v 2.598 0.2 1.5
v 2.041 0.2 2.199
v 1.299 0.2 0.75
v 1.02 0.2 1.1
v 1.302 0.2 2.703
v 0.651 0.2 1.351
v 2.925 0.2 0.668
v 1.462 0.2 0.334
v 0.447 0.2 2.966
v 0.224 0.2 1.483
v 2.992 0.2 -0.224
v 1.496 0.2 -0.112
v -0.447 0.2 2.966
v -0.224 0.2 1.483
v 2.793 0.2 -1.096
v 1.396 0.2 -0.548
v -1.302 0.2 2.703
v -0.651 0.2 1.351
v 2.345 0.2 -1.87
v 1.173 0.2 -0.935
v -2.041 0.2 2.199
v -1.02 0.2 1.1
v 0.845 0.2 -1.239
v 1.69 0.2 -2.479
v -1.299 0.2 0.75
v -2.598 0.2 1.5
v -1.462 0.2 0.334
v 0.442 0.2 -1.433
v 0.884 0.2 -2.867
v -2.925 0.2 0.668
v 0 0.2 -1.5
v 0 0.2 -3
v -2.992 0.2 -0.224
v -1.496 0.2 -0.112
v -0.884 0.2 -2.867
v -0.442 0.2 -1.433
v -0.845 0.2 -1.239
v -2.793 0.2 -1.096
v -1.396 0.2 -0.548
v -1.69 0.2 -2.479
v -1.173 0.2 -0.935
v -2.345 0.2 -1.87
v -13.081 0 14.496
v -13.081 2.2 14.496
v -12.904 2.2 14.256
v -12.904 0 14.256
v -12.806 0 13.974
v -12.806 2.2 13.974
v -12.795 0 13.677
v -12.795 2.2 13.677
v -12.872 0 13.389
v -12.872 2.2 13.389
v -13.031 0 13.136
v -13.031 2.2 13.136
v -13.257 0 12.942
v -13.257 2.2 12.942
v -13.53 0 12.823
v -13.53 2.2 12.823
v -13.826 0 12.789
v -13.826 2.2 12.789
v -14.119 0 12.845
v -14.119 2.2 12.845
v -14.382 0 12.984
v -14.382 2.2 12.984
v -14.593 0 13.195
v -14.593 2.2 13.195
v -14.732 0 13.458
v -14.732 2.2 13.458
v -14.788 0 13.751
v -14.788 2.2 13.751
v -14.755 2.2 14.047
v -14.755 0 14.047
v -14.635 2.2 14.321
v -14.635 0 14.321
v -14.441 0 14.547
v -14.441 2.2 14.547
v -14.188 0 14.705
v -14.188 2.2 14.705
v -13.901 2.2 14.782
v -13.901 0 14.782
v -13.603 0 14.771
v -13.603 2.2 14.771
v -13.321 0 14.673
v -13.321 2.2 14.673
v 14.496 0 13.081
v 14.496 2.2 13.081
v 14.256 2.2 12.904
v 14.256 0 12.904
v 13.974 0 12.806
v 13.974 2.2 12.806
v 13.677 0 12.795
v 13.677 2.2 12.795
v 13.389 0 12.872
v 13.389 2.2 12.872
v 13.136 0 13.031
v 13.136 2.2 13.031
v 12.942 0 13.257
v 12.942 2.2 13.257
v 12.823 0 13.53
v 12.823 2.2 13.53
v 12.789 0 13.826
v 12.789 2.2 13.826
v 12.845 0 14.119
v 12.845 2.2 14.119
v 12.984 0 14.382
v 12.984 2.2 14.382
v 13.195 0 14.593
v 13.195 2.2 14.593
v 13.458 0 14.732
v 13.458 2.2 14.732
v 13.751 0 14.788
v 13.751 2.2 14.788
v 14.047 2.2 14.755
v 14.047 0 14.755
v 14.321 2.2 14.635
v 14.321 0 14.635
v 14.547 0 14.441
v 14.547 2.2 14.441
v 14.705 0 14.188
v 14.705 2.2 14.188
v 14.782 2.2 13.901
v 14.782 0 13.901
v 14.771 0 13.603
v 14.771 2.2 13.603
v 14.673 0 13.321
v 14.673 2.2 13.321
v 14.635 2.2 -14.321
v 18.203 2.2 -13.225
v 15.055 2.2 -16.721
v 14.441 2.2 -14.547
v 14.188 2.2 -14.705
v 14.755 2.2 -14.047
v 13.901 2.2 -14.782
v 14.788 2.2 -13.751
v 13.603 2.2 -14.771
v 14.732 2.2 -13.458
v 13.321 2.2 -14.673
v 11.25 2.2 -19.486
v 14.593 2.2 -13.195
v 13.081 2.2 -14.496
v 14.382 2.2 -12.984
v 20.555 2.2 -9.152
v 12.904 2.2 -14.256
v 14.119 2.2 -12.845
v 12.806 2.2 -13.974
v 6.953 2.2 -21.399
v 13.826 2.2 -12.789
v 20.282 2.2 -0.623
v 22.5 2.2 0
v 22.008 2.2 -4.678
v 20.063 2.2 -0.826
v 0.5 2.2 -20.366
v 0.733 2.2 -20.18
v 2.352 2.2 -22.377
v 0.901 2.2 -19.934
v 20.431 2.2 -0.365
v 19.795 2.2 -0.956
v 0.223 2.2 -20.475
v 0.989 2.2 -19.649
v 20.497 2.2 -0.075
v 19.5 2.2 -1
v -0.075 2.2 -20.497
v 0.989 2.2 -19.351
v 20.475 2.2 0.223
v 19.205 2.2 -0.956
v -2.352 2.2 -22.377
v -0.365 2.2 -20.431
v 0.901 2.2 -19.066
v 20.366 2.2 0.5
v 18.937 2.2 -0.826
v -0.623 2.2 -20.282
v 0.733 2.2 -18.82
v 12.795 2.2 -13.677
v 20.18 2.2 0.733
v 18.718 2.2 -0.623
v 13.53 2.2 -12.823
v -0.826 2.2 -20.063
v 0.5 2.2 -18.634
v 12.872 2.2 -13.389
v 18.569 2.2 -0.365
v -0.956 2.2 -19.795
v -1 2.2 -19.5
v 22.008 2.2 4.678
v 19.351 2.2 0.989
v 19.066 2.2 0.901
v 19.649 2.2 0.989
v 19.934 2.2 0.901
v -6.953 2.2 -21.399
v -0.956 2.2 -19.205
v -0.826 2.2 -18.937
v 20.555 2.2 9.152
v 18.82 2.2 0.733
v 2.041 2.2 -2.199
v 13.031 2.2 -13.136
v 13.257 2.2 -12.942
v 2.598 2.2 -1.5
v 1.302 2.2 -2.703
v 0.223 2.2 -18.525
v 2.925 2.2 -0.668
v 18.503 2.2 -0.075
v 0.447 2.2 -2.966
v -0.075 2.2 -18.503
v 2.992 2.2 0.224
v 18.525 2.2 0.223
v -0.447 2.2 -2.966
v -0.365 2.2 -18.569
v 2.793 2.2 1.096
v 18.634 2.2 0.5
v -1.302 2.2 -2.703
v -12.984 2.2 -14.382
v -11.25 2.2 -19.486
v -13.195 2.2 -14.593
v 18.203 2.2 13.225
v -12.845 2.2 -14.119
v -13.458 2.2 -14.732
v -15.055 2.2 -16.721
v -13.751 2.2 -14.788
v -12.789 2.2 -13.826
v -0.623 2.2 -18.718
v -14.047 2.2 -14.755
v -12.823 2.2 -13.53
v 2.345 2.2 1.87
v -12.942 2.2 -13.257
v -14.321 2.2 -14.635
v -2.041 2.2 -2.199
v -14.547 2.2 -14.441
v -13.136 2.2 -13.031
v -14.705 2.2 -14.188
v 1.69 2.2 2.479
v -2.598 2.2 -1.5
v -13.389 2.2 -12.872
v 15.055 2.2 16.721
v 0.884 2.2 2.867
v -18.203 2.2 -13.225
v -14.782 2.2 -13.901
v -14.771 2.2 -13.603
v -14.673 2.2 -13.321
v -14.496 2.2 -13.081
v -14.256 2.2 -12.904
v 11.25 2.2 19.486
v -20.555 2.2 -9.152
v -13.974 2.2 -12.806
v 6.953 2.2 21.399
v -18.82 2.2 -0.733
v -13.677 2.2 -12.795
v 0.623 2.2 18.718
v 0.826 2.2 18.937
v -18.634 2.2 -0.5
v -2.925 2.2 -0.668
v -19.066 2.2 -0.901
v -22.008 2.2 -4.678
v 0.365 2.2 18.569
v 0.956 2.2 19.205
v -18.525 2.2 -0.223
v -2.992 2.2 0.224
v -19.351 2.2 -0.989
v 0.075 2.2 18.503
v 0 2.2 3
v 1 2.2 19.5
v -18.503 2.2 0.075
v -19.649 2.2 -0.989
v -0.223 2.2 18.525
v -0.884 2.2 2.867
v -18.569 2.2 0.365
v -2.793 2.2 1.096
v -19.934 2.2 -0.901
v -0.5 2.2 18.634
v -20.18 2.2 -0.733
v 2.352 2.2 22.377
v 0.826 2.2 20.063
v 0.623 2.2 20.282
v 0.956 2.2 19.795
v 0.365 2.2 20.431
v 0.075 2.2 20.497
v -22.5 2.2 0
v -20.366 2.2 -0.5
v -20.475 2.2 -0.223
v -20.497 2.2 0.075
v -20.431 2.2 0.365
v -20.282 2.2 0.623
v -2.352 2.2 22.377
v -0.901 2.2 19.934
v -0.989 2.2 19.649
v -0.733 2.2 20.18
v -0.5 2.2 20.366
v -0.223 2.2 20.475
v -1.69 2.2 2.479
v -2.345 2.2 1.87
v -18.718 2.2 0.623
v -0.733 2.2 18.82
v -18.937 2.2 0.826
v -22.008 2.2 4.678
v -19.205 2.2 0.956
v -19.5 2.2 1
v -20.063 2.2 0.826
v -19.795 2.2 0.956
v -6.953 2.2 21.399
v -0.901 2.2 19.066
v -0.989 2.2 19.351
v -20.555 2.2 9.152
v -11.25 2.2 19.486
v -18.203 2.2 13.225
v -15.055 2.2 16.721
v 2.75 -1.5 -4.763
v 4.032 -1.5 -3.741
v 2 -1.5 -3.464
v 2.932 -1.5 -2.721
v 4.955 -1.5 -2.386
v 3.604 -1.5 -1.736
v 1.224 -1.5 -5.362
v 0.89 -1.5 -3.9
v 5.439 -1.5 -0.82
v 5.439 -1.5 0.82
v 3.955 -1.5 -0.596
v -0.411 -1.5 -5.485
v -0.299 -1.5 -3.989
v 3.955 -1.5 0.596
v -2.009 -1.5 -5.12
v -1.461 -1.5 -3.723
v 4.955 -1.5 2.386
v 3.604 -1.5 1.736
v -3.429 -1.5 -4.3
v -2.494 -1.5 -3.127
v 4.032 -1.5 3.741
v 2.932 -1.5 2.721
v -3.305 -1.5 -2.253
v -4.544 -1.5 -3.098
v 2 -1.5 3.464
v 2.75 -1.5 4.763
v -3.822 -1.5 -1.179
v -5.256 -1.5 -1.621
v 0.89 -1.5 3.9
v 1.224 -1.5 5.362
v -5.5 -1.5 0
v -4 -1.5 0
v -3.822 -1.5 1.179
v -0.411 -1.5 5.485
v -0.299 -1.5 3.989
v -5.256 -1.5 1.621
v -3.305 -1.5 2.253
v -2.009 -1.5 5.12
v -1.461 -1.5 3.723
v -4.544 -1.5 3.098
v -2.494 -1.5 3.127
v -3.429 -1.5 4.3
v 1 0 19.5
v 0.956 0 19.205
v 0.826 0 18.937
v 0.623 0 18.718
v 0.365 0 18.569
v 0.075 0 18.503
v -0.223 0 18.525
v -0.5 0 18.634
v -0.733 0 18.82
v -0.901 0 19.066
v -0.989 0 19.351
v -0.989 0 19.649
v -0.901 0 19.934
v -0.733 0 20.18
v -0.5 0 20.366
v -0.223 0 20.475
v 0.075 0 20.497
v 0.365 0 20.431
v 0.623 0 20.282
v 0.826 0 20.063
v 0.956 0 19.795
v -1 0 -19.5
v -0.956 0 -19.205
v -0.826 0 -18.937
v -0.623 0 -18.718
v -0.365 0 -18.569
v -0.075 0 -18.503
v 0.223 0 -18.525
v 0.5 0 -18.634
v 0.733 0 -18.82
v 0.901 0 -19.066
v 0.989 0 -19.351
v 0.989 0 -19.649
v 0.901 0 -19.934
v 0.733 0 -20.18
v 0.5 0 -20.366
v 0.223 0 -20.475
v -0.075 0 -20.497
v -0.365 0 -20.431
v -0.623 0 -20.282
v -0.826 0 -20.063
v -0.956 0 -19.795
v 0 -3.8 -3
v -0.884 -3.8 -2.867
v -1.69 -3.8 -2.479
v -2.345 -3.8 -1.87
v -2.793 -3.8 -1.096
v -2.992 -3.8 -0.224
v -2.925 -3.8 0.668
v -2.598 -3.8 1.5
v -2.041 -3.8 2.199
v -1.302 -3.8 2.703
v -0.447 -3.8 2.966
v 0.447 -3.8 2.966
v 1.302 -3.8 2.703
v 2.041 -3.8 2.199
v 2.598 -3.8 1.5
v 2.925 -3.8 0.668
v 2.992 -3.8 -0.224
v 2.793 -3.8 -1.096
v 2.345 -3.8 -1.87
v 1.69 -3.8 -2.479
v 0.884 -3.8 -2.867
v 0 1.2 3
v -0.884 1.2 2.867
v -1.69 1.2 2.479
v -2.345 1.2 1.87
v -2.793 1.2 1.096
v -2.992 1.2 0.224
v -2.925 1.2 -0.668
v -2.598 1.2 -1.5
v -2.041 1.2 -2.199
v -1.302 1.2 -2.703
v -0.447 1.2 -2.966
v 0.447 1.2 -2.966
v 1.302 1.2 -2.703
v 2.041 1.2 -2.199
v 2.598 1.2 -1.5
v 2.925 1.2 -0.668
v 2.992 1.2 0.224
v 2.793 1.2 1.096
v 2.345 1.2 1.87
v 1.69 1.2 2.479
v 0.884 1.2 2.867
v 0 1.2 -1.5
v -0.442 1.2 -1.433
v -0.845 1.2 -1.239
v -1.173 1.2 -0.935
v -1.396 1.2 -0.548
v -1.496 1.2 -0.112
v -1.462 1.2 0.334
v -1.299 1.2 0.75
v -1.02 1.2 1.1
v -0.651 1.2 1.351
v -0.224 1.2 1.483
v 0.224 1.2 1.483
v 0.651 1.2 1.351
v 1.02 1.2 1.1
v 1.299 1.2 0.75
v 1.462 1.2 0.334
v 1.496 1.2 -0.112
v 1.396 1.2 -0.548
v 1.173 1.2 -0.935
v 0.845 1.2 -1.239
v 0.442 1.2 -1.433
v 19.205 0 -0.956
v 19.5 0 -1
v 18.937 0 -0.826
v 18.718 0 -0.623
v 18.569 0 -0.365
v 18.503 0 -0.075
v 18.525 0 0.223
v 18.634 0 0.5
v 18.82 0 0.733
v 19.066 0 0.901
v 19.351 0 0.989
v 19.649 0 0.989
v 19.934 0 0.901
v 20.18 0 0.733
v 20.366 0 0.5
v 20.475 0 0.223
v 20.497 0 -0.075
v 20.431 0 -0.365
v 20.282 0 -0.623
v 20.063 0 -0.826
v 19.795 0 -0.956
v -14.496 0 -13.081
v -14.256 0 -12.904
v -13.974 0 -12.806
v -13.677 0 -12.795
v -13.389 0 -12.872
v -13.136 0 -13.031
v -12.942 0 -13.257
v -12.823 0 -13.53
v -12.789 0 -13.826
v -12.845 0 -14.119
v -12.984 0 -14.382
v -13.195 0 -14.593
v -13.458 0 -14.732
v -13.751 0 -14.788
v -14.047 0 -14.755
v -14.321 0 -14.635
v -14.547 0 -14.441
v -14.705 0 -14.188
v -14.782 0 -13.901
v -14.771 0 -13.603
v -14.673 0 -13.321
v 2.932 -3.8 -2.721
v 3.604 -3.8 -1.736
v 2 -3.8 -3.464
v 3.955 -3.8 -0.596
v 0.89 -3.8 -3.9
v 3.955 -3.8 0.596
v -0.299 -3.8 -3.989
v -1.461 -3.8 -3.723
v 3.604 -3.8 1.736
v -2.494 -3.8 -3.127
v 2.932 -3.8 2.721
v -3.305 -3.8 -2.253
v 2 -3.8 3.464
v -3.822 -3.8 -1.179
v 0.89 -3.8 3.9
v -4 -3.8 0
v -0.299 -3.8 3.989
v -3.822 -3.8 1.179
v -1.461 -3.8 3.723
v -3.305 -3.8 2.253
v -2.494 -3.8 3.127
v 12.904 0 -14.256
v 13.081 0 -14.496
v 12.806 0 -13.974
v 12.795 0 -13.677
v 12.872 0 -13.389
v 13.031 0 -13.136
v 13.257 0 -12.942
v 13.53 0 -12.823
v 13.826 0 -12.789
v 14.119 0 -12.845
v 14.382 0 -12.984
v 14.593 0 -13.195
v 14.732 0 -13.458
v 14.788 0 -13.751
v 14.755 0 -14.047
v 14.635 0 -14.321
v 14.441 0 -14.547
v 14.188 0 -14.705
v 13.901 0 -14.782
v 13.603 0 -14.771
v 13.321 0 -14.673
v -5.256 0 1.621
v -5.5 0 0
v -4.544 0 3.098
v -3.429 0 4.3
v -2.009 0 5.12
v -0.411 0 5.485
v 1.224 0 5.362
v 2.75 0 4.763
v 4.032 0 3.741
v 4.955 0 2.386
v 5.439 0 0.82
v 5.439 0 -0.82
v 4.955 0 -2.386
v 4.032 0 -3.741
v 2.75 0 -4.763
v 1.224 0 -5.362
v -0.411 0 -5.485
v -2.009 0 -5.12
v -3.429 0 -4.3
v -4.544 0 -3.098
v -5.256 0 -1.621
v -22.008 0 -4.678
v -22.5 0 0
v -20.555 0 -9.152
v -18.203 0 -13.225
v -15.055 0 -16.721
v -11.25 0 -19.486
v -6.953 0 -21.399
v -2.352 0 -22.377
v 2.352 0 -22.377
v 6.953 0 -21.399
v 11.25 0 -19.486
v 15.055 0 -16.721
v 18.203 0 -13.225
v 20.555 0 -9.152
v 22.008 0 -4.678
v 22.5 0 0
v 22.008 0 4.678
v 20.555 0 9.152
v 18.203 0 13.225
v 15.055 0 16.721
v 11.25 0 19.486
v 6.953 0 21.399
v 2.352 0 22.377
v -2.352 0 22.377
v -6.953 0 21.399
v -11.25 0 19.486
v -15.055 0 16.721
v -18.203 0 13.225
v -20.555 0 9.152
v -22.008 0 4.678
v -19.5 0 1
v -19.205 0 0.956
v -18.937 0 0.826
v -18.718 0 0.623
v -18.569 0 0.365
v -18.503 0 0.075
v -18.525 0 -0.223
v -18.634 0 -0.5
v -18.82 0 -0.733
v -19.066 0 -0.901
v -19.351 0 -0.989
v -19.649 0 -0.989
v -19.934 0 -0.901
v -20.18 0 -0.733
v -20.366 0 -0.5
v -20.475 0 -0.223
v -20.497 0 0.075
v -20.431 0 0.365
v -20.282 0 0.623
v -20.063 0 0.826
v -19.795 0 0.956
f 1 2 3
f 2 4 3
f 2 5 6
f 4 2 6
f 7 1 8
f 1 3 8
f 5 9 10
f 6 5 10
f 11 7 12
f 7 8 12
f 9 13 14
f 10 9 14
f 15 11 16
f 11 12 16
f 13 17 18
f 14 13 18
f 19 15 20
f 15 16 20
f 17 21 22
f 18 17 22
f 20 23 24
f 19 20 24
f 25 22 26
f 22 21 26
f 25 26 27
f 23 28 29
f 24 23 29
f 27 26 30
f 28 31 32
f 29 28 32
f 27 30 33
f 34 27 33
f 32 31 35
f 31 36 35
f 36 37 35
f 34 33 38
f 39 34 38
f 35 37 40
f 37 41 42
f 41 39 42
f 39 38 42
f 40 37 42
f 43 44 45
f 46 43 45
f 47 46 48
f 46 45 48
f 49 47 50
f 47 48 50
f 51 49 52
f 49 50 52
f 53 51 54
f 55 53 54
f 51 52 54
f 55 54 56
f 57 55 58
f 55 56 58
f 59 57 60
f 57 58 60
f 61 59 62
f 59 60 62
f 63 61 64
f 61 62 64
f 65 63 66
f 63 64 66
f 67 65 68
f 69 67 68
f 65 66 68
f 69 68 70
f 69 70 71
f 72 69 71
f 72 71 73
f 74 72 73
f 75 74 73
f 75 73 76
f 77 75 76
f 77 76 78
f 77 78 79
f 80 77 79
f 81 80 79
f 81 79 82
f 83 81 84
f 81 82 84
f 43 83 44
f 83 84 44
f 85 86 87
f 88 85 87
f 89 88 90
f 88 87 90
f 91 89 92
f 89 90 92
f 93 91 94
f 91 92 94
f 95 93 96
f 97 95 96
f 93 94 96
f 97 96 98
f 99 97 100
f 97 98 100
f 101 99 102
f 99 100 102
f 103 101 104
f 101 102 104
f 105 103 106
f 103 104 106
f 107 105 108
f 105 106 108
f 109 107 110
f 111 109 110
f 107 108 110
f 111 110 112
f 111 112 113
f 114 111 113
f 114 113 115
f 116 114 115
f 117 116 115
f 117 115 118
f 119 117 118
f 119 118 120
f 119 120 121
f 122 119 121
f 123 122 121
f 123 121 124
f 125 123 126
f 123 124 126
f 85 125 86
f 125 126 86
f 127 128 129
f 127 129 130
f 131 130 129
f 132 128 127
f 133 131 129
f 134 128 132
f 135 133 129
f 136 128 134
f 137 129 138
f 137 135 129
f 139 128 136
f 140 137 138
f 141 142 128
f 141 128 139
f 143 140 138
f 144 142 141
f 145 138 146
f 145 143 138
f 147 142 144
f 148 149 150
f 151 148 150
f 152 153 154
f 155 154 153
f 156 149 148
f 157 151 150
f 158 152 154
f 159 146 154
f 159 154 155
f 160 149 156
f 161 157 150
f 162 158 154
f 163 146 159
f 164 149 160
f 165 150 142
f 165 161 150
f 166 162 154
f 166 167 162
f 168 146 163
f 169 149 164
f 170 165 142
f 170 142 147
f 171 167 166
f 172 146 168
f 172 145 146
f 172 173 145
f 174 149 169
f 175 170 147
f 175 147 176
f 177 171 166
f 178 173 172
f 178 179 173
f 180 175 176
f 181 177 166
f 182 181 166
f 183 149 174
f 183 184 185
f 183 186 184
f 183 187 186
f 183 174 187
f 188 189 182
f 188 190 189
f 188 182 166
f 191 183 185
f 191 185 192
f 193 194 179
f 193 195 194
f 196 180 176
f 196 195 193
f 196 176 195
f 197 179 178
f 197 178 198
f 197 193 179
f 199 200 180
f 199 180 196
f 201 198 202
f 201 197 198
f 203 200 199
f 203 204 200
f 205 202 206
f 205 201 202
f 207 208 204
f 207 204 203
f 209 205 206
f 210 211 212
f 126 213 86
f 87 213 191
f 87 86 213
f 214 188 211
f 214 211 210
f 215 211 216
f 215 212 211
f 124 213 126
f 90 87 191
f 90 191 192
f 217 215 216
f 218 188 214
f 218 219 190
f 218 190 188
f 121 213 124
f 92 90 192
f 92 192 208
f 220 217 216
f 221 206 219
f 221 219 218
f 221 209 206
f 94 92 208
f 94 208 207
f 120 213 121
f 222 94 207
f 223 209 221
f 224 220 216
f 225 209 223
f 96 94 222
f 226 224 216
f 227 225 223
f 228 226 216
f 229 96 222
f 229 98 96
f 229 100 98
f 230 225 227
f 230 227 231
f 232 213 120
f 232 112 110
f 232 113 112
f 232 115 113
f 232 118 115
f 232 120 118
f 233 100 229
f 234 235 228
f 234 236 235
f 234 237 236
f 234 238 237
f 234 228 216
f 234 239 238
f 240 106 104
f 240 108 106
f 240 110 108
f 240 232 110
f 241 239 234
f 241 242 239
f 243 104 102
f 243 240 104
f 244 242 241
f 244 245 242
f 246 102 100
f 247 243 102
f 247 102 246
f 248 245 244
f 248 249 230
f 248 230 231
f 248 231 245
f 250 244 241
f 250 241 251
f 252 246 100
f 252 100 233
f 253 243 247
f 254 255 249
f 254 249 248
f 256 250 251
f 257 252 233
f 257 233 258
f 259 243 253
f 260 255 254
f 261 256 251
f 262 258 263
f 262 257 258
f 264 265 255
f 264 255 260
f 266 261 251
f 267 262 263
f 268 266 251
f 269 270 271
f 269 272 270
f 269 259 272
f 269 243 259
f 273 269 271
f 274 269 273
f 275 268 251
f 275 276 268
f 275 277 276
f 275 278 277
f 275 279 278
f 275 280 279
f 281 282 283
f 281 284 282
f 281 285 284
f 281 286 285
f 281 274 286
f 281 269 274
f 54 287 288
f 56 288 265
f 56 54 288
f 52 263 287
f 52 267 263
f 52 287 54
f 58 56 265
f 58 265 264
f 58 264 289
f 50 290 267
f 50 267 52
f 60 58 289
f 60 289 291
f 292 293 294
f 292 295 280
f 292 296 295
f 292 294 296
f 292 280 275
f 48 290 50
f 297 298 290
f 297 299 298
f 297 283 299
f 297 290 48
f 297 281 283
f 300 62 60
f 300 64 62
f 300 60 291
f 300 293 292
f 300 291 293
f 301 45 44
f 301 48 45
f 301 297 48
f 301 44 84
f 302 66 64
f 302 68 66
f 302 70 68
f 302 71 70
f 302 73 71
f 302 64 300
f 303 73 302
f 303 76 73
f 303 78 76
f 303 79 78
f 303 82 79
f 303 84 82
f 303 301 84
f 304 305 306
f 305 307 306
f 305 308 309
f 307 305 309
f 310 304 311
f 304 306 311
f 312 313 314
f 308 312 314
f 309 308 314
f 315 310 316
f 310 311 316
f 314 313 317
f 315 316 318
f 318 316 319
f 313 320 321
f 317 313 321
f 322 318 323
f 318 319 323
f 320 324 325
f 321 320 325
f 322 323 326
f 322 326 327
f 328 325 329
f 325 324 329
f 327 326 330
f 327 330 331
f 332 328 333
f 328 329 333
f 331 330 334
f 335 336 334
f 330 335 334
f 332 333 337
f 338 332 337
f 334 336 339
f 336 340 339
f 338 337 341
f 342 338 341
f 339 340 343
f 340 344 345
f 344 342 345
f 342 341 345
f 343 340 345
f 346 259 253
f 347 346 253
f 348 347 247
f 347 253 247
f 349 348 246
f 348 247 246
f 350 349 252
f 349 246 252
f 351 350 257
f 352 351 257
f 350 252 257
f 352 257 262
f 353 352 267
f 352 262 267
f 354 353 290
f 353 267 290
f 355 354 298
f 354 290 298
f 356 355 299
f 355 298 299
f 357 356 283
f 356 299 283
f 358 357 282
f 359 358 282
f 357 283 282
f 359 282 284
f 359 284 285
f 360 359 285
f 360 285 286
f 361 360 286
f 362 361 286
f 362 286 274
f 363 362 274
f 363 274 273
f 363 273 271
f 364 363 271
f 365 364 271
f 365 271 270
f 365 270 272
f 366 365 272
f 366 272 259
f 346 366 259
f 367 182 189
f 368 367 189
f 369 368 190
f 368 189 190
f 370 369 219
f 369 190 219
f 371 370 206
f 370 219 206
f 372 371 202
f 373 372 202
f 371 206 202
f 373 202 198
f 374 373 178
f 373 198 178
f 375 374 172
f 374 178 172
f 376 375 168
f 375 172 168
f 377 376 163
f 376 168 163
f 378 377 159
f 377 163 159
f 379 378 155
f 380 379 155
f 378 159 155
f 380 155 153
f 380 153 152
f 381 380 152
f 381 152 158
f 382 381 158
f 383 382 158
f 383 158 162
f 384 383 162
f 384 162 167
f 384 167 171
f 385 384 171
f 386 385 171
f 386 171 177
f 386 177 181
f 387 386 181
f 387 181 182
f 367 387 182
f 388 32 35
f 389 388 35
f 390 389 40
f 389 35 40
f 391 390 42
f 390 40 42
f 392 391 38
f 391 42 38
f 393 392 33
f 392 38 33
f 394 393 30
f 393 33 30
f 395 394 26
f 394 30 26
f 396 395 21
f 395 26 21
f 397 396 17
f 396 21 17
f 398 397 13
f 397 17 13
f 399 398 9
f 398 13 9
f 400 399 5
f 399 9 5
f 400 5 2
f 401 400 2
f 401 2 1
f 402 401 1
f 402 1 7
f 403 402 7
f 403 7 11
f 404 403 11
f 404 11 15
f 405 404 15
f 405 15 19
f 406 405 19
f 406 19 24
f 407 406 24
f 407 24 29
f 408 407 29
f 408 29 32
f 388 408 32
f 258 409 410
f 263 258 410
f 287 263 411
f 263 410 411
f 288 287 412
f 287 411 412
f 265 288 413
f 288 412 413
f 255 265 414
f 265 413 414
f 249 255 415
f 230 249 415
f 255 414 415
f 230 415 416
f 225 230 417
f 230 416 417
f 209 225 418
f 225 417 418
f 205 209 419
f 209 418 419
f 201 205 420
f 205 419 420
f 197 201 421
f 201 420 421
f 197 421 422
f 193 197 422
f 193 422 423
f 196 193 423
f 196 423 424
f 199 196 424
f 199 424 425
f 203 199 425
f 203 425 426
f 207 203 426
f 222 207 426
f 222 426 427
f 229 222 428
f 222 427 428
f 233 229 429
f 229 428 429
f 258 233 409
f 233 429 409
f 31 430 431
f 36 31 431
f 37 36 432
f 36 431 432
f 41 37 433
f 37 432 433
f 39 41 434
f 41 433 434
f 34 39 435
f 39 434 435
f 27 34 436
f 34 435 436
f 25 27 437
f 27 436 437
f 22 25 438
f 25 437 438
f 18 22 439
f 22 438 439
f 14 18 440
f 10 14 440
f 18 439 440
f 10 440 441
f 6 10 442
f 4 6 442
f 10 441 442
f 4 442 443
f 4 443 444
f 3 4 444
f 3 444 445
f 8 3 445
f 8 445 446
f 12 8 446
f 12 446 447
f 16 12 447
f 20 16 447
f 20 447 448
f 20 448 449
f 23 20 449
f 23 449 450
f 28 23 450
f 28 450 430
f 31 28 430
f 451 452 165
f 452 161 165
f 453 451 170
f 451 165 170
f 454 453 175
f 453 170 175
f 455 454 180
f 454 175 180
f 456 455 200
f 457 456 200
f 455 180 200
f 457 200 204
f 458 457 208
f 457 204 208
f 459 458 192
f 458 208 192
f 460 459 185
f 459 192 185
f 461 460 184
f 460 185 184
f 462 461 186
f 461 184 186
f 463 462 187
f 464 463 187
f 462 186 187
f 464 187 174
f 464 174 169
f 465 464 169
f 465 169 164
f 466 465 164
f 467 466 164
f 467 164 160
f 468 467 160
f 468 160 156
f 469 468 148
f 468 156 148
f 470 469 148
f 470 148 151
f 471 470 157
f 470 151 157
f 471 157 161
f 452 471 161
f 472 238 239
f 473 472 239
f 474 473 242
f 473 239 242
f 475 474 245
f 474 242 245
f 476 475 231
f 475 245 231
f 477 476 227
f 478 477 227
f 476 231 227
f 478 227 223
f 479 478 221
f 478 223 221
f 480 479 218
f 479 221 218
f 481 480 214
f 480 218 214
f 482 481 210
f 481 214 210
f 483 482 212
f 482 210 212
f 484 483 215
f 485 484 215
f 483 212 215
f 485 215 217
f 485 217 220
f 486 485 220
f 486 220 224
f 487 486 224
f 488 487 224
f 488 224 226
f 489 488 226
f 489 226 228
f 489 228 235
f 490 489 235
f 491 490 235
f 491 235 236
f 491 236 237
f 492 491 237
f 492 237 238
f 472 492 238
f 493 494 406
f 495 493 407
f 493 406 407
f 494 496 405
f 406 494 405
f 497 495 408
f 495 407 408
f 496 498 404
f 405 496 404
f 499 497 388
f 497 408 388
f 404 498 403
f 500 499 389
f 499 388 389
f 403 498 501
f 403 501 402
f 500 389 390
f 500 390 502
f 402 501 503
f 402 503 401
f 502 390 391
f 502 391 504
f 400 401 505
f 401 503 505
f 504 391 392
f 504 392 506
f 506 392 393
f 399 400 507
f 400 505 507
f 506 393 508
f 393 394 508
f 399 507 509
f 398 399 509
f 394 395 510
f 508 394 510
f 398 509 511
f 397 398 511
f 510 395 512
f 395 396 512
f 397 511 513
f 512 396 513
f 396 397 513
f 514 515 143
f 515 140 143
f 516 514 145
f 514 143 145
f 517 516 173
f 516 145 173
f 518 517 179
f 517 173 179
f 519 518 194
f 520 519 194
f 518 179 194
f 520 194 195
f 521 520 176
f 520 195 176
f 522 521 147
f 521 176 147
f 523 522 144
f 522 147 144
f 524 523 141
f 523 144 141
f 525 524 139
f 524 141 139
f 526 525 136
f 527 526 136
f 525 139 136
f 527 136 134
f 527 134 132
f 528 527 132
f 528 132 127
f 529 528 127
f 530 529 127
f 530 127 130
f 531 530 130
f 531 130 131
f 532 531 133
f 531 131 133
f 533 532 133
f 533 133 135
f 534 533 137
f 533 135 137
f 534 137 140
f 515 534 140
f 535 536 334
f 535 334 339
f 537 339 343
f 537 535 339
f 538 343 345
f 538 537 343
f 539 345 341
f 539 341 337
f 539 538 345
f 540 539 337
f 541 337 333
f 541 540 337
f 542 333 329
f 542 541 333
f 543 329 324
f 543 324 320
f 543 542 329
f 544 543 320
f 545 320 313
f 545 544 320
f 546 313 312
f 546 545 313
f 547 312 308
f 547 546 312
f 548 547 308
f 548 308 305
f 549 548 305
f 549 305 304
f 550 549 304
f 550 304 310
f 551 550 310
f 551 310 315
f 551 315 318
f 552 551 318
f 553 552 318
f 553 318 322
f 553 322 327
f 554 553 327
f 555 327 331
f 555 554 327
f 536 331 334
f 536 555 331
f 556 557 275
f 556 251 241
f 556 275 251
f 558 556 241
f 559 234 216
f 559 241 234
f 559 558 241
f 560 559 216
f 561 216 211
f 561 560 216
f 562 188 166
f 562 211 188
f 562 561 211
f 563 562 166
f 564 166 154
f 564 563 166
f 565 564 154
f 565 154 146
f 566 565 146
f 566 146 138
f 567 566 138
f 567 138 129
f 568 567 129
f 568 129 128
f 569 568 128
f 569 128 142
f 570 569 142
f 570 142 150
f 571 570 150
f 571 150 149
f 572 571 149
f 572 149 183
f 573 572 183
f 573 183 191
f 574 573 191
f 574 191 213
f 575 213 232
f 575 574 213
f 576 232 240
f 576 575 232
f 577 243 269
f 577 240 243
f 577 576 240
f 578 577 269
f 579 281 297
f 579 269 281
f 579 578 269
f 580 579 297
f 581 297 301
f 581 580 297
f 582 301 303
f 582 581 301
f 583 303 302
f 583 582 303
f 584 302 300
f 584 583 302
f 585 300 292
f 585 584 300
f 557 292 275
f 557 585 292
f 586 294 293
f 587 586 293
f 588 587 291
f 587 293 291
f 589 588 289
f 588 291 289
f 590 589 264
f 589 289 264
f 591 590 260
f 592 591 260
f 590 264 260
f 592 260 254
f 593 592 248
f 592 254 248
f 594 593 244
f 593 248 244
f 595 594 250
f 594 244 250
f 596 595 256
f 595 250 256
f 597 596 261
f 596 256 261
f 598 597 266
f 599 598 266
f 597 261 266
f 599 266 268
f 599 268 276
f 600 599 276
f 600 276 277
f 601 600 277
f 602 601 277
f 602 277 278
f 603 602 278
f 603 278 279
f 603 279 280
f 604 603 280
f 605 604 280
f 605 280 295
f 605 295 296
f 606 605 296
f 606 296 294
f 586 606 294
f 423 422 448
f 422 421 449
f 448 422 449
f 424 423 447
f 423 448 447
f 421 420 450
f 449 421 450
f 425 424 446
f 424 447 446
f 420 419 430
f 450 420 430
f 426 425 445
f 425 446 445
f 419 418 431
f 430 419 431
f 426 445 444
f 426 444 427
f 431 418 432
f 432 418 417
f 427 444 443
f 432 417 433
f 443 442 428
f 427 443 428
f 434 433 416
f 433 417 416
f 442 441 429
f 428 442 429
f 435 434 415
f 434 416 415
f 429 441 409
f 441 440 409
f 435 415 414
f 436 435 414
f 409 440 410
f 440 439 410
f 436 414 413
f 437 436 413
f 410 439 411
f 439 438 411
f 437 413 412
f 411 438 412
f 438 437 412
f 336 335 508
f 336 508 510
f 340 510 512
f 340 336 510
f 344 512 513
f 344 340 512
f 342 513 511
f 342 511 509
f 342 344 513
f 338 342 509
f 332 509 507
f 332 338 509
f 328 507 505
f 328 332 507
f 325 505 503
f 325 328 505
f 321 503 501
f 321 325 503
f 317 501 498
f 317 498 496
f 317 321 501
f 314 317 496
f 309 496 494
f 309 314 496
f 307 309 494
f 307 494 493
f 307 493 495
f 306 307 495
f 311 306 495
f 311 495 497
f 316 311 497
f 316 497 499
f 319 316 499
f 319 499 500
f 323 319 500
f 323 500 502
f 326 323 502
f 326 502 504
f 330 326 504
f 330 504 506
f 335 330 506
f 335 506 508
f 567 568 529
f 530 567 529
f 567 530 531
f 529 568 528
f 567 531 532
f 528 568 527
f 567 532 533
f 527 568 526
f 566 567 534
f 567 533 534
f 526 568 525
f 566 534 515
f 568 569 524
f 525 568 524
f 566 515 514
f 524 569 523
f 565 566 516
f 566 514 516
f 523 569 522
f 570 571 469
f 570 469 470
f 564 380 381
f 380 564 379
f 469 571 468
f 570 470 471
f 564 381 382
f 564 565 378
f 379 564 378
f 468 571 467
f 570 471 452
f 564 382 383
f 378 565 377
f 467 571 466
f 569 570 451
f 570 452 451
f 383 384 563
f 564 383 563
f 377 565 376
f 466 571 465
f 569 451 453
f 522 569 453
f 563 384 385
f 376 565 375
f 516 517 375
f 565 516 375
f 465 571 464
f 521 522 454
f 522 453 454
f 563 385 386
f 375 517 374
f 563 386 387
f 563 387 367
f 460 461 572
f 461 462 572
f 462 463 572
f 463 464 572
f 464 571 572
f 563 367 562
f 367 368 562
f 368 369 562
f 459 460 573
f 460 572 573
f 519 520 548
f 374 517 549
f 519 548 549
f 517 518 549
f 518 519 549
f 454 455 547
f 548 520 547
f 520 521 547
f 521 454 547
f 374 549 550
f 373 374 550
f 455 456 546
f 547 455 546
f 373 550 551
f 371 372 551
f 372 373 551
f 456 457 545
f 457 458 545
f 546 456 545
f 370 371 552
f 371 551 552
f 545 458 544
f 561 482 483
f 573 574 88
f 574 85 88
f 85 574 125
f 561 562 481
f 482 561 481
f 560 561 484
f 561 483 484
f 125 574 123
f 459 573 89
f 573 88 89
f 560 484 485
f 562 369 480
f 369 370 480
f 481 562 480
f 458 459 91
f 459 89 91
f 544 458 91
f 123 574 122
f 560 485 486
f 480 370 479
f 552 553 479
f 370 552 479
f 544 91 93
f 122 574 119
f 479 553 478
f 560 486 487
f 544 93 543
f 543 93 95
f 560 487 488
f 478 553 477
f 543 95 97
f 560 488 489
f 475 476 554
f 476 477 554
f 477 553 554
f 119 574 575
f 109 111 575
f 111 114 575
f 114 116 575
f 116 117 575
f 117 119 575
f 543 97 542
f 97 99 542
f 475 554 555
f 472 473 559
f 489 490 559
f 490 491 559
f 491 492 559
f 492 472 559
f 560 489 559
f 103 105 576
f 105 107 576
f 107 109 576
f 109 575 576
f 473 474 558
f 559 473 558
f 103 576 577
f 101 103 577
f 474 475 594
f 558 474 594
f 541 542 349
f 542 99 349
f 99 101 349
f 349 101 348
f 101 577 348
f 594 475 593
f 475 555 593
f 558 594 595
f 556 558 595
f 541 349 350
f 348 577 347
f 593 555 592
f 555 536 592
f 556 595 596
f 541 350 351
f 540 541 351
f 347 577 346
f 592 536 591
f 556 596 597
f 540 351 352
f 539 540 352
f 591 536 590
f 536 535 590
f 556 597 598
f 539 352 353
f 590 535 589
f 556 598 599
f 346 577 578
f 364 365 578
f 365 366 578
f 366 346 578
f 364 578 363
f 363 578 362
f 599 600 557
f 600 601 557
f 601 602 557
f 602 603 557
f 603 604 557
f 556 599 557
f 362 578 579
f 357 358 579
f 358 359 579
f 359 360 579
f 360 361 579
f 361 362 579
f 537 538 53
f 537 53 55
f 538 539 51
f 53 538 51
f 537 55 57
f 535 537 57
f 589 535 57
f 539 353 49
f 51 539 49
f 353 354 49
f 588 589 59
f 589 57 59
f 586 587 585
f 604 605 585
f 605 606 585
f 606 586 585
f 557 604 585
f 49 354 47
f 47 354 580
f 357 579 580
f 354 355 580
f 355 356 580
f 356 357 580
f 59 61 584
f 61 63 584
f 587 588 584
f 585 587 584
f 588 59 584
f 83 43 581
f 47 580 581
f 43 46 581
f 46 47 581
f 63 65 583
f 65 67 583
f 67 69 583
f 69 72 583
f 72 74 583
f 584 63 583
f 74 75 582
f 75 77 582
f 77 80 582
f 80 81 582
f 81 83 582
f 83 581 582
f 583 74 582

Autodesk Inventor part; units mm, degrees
ref_plane "YZ Plane" through (0, 0, 0) normal (1, 0, 0) x (0, 1, 0)
ref_plane "XZ Plane" through (0, 0, 0) normal (0, 1, 0) x (-1, 0, 0)
ref_plane "XY Plane" through (0, 0, 0) normal (0, 0, 1) x (1, 0, 0)
sketch "Sketch1" plane through (0, 0, 0) normal (0, 1, 0) x (-1, 0, 0)
  circle A0 centre (0, 0) radius 4
  circle A1 centre (0, 0) radius 5.5
  circle A2 centre (0, 0) radius 22.5
  line L0 (0, 0) -> (-19.5, 0) construction
  dimension "d0" = 8
  dimension "d1" = 11
  dimension "d2" = 45
  dimension "d3" = 19.5
extrude "Extrusion1" add sketch "Sketch1" along normal blind 2.2 contours A0 | A1 | A2
extrude "Extrusion2" add sketch "Sketch1" against normal blind 3.8 contours A0
extrude "Extrusion3" add sketch "Sketch1" against normal blind 1.5 contours A1
hole "Hole1" at (19.5, 0, 0) direction (0, 1, 0) diameter 2 end through all
hole "Hole2" at (0, -3.8, 0) direction (0, 1, 0) diameter 3 end through all
hole "Hole3" at (0, -3.8, 0) direction (0, 1, 0) diameter 6 depth 4
hole "Hole4" at (0, 2.2, 0) direction (0, -1, 0) diameter 6 depth 1
pattern_circular "Circular Pattern1" count 8 over 360 about axis through (0, -10, 0) along (0, 1, 0) of "Hole1"
properties part number "servo arm TGY-S4505B round large"
